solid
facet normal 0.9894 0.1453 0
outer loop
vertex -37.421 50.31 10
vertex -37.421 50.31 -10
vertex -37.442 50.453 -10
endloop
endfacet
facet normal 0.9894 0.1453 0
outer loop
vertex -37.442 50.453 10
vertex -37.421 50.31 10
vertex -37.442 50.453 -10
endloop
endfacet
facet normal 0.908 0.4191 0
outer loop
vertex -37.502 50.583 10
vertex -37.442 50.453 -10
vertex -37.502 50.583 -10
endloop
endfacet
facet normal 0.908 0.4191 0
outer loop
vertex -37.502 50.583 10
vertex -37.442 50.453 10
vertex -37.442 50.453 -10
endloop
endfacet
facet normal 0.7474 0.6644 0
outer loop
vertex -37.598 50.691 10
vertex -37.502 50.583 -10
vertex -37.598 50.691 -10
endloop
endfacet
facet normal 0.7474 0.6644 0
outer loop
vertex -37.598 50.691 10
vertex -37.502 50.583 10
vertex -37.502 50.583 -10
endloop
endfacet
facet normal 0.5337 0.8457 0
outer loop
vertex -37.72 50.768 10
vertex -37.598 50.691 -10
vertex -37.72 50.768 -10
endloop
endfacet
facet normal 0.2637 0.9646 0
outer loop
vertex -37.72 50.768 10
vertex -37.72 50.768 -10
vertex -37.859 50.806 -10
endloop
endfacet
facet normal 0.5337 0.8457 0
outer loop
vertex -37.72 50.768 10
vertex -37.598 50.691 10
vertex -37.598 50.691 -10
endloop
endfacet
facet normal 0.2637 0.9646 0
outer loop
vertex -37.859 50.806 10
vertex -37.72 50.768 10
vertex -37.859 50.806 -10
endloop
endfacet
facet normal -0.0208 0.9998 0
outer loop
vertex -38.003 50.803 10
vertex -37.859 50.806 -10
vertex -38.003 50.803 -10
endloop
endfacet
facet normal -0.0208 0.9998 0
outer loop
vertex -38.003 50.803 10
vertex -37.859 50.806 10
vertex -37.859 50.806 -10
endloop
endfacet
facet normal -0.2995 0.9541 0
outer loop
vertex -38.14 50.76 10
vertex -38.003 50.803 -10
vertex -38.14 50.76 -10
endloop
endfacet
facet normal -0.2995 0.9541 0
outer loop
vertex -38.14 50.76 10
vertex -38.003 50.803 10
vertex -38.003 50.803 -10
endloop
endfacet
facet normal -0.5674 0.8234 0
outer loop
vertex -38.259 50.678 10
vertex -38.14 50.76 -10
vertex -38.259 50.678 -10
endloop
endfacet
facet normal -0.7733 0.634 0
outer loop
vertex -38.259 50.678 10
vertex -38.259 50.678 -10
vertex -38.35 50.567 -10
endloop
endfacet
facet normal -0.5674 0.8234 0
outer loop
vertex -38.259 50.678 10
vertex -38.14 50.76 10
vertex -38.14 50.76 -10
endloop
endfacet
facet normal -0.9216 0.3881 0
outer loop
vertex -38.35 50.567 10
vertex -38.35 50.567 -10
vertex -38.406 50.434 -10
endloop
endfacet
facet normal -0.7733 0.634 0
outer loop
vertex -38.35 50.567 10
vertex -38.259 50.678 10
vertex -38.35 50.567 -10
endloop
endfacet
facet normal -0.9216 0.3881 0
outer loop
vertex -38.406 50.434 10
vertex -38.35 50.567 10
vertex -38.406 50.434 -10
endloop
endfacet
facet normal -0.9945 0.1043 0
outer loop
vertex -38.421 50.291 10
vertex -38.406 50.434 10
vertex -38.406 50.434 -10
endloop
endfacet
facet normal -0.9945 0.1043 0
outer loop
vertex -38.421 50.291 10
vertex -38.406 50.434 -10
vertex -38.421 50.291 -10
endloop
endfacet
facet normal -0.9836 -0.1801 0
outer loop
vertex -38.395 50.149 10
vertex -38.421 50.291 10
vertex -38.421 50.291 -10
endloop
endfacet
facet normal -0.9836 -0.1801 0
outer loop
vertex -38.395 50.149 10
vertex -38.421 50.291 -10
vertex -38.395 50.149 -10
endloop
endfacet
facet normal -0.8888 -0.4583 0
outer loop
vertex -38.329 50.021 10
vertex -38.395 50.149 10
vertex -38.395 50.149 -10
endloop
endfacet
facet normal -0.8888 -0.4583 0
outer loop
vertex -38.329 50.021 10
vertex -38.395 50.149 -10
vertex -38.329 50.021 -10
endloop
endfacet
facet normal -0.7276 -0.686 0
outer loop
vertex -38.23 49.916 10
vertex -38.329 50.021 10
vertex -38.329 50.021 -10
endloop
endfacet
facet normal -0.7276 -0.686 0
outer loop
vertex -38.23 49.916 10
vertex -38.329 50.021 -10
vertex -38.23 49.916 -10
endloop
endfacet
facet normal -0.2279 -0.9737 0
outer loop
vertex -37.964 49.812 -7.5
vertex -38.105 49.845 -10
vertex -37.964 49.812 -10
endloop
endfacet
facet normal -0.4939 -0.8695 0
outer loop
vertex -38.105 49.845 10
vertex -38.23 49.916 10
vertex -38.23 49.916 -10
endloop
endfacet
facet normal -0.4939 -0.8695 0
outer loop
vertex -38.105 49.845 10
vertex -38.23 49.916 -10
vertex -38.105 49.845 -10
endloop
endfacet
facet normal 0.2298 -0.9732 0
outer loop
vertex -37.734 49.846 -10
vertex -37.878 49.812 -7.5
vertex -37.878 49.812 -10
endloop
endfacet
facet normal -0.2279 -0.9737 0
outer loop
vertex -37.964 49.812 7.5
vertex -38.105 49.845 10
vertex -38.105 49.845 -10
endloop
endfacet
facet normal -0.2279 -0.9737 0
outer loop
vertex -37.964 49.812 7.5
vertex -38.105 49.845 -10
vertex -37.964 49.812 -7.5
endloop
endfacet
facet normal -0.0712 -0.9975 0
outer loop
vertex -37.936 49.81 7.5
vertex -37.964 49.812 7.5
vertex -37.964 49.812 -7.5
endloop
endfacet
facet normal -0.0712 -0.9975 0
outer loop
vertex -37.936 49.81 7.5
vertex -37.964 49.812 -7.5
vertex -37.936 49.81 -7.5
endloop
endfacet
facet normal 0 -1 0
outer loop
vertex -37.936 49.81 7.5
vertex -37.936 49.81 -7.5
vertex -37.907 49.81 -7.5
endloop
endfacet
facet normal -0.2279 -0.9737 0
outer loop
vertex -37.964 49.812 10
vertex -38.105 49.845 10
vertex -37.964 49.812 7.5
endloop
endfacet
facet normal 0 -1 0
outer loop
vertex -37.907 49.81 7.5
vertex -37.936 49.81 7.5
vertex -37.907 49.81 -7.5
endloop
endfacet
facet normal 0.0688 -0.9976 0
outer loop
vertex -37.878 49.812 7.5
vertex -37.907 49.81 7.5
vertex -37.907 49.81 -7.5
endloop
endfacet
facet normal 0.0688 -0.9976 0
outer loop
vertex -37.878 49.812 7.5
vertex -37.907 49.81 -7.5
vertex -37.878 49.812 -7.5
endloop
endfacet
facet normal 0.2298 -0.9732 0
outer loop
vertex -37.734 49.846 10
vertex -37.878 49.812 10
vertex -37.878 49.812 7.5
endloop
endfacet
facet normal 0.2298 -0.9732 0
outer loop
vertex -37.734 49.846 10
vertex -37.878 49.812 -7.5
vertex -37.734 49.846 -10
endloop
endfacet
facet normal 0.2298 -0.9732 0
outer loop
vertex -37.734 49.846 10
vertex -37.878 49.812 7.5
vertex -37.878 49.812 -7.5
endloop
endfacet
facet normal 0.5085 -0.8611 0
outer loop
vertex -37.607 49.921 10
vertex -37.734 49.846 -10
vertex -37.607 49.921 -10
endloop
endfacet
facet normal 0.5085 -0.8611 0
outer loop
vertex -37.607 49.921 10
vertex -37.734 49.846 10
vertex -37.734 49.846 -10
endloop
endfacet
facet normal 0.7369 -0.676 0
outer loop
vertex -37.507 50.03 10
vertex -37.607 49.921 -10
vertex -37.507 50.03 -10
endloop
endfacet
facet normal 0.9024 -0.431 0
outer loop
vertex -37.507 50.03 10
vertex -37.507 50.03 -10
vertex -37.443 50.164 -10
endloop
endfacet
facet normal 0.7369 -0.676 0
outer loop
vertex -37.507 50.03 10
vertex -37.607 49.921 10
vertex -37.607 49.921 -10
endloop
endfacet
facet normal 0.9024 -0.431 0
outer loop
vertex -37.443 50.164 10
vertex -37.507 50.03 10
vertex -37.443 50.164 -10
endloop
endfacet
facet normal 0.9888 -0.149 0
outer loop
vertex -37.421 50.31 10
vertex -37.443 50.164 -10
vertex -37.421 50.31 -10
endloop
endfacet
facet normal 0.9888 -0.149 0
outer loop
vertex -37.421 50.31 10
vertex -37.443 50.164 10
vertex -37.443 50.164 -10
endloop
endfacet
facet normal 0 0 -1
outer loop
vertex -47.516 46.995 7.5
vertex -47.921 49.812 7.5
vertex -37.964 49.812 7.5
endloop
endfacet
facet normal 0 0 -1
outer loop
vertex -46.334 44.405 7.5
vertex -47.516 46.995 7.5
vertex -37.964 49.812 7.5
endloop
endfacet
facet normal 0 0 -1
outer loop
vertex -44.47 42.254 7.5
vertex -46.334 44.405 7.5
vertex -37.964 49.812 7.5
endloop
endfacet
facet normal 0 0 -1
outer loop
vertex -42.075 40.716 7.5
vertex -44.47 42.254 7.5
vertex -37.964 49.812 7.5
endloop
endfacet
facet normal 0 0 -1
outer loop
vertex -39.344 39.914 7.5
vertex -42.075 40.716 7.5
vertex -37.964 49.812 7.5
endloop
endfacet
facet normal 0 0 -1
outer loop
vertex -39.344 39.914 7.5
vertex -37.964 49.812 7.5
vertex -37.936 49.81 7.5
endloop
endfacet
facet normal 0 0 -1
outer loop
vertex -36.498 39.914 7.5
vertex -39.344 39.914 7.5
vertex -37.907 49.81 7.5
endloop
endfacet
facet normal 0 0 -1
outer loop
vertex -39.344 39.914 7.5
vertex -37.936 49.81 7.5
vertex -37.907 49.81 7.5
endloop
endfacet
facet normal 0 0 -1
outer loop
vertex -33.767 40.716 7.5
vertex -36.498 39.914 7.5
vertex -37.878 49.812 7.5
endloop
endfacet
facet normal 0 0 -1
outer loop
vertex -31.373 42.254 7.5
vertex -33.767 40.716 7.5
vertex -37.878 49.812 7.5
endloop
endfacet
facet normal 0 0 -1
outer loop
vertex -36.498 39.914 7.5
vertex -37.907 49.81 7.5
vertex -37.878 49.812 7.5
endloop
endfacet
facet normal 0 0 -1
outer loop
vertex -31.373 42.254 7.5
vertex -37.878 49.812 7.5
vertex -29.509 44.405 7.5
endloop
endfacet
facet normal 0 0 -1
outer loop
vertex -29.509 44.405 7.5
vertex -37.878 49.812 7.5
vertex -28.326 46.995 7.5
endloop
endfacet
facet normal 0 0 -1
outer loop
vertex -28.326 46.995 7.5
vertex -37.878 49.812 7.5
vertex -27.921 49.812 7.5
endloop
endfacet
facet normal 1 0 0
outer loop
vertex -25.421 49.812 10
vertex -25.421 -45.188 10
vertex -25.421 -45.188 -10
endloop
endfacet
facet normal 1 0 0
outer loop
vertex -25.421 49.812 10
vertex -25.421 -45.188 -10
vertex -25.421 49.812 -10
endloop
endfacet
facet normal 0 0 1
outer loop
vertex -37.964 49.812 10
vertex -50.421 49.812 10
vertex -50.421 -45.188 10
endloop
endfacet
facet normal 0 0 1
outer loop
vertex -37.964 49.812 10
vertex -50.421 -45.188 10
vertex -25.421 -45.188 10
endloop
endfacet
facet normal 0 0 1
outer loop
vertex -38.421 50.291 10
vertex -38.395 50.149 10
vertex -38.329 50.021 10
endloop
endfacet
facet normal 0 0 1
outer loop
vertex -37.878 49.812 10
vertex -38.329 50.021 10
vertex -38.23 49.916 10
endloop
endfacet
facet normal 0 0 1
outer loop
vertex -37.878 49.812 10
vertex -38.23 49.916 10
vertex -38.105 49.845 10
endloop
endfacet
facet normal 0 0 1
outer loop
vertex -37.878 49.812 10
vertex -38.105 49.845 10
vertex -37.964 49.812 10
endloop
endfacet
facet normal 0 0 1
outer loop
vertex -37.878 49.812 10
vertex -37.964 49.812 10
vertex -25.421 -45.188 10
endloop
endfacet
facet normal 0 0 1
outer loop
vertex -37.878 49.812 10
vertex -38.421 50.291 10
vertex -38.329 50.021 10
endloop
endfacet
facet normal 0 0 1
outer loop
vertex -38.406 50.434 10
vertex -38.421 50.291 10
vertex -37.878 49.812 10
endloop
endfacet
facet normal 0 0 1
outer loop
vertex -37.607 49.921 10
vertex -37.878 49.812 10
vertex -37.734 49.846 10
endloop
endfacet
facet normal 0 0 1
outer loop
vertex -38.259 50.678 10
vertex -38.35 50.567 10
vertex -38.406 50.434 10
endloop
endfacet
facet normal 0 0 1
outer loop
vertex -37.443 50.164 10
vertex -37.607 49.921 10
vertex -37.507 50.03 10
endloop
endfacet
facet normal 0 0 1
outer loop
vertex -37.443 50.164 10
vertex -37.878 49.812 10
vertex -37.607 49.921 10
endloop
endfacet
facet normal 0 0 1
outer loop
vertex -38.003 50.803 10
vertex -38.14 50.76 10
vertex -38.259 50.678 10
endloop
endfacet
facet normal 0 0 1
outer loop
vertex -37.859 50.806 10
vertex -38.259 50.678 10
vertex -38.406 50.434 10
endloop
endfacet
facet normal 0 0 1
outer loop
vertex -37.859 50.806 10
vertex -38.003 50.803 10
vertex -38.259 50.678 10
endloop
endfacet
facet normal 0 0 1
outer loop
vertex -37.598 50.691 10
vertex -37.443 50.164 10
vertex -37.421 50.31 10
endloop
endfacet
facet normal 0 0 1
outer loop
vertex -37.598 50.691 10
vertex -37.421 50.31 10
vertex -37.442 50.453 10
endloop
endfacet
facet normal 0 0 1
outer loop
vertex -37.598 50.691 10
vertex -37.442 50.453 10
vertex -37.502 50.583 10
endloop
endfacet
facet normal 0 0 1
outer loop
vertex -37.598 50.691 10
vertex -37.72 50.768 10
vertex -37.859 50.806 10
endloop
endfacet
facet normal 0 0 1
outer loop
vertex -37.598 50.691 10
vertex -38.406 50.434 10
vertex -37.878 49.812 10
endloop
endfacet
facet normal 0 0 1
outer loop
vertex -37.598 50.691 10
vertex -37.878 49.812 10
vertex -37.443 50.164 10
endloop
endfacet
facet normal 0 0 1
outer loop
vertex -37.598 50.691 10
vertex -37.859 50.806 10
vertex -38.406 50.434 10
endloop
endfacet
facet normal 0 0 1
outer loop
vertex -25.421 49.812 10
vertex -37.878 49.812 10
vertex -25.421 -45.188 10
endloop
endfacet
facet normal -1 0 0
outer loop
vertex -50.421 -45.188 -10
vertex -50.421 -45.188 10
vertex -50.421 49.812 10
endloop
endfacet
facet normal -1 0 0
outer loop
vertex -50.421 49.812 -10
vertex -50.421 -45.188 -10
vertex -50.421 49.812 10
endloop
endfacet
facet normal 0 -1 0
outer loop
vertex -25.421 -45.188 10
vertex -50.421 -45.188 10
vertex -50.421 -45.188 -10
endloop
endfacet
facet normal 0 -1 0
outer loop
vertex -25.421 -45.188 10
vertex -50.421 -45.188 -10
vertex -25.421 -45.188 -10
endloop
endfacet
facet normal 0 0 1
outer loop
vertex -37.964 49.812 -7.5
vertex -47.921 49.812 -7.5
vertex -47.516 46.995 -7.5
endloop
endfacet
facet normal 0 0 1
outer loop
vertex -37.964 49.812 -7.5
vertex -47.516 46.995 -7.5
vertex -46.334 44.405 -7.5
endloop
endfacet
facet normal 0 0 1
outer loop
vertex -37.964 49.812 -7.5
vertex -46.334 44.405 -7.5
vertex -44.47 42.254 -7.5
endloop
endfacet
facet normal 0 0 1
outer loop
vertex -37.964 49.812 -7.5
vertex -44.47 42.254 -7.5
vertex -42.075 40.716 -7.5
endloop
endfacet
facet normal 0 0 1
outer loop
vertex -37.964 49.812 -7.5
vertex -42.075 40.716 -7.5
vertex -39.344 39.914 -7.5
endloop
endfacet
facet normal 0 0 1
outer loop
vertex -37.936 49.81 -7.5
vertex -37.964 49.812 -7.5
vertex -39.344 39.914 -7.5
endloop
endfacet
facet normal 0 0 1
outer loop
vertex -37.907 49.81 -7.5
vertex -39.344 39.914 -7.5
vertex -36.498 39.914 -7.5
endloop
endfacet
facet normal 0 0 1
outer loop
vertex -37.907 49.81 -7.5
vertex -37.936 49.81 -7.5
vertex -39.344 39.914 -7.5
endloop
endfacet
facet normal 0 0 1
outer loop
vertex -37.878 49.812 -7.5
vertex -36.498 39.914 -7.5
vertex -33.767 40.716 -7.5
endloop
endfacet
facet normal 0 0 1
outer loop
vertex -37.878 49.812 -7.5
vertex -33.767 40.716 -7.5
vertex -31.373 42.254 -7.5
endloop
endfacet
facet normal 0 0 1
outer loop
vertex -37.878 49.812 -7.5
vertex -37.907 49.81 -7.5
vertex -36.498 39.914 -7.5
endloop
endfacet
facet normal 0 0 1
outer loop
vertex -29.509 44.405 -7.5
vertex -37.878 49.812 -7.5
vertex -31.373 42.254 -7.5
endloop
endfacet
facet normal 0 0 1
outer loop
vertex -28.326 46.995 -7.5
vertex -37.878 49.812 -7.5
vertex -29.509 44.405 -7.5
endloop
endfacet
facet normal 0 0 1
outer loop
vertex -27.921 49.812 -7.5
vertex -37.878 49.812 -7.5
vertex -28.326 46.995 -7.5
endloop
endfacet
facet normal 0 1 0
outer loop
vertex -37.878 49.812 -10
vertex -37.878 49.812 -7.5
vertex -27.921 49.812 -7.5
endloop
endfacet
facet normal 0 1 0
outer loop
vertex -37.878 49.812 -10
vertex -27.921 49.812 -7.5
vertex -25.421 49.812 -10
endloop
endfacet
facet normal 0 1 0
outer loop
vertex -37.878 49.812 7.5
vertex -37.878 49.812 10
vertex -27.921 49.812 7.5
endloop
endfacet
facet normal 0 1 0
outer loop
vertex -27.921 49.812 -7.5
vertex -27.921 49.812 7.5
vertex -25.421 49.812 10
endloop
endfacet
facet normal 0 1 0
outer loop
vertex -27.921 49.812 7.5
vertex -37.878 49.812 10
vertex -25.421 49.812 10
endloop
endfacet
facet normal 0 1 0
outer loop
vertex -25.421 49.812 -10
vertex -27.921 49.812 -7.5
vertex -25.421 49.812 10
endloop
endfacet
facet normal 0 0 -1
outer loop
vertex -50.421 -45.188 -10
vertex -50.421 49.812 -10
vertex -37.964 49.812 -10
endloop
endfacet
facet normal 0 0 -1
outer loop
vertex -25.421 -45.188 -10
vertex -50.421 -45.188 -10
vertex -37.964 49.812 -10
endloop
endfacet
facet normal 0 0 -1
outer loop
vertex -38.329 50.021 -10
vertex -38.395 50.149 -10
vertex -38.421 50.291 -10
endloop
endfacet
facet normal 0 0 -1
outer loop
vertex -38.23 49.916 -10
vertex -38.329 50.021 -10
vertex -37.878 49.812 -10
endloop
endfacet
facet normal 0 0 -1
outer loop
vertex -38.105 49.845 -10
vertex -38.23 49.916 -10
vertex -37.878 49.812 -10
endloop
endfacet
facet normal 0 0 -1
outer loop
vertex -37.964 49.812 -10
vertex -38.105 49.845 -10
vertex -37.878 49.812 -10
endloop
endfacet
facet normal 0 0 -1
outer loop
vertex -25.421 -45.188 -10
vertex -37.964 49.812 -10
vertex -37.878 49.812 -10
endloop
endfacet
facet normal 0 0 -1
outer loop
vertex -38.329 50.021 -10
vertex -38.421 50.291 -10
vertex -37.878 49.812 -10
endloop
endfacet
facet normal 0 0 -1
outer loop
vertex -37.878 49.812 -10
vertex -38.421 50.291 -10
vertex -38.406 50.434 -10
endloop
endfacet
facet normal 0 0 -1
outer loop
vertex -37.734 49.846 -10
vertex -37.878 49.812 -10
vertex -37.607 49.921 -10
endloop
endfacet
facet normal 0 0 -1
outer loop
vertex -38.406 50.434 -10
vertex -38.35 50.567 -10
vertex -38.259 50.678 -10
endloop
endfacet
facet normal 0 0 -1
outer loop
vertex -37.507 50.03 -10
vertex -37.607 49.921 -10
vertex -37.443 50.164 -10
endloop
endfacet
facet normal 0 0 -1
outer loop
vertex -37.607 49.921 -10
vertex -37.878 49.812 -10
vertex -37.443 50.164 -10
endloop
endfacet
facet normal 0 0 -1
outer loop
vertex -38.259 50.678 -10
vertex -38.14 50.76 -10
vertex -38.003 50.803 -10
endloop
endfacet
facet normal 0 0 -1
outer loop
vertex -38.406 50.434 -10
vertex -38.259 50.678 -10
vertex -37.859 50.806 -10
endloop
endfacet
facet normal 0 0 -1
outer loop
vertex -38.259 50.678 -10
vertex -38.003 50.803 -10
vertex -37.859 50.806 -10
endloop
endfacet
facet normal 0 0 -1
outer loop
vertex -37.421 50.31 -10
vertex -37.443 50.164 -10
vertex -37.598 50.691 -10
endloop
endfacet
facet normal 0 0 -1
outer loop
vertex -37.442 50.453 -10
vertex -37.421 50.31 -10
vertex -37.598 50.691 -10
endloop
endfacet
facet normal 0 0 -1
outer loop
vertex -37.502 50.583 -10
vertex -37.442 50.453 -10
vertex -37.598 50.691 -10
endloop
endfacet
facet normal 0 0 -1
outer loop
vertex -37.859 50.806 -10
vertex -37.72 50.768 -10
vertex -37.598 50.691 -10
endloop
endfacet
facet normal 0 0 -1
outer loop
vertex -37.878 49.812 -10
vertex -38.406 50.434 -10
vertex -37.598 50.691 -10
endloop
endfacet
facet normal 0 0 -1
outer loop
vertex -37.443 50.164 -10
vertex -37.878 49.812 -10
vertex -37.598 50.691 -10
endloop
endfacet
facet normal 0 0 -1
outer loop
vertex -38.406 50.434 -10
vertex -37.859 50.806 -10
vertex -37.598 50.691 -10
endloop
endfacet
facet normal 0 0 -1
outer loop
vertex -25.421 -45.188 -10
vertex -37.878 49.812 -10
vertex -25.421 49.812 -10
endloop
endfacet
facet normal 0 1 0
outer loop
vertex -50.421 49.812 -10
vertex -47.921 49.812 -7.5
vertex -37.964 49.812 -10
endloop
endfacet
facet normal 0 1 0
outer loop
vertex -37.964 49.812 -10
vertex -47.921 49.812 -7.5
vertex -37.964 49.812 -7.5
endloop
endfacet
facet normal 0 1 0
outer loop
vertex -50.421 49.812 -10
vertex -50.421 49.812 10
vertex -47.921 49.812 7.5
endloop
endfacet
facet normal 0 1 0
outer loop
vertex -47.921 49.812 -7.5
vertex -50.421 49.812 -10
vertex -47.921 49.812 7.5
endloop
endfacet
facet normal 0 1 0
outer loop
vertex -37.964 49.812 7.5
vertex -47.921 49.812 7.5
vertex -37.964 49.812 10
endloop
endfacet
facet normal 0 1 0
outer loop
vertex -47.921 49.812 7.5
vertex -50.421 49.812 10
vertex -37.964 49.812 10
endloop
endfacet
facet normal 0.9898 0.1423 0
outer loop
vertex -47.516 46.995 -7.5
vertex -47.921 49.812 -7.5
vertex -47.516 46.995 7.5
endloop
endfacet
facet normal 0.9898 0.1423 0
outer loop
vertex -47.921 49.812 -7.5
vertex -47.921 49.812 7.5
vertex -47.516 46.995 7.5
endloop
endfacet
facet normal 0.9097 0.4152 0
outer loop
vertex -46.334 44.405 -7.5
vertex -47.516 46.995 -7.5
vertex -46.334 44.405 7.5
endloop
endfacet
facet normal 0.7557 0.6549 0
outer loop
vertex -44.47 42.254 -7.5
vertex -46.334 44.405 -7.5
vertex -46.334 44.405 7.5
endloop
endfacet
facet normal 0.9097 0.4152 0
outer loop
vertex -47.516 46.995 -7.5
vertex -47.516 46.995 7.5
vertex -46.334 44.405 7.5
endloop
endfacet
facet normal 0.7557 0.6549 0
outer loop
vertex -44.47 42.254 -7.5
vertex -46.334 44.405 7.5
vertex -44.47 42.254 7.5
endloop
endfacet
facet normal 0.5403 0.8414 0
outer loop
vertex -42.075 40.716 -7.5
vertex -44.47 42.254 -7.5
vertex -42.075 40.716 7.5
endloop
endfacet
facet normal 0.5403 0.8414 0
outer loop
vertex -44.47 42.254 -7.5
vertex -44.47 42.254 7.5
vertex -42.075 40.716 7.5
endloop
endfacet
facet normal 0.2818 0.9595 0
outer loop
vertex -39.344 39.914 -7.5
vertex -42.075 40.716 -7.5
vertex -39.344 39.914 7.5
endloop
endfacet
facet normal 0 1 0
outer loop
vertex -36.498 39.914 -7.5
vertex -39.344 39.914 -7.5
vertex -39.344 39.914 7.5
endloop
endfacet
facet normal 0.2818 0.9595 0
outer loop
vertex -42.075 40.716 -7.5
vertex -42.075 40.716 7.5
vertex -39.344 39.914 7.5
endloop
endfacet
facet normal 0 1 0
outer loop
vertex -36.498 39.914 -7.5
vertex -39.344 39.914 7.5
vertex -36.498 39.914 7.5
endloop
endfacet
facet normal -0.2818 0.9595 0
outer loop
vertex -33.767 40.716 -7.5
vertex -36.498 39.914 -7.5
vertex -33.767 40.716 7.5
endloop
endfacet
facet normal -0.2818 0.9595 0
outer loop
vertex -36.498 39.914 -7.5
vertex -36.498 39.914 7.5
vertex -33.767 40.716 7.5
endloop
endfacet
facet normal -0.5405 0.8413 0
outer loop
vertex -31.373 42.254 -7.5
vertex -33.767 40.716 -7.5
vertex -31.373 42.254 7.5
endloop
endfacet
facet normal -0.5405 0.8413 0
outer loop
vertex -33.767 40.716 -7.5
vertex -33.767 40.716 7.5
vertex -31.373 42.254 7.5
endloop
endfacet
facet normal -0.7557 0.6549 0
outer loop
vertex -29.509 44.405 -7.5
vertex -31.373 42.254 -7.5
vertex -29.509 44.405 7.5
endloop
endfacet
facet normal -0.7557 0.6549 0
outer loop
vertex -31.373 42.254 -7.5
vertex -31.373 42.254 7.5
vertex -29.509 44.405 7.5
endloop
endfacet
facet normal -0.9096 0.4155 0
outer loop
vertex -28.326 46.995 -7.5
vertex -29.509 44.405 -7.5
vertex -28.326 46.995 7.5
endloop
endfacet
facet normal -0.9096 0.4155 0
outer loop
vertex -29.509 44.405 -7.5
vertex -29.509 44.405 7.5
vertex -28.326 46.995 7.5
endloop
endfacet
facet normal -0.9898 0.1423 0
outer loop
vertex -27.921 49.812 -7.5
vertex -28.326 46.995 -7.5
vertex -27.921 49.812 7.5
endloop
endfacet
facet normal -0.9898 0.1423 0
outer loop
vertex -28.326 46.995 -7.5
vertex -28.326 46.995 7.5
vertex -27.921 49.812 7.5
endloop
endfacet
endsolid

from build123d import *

# Parameters (mm, degrees)
SKETCH1_W           = 25
SKETCH1_H           = 95
BOSS_EXTRUDE1_DEPTH = 10
SKETCH2_R           = 10
CUT_EXTRUDE1_DEPTH  = 7.5
SWEEP1_PROFILE_R    = 0.5


with BuildPart() as part:
    # Sketch1 → Boss-Extrude1 (new body, symmetric)
    with BuildSketch(Plane.XY):
        with Locations((-37.921146953, 2.311827957)):
            Rectangle(SKETCH1_W, SKETCH1_H)
    extrude(amount=BOSS_EXTRUDE1_DEPTH, both=True)

    # Sketch2 → Cut-Extrude1 (cut, symmetric)
    with BuildSketch(Plane.XY):
        with Locations((-37.921146953, 49.811827957)):
            Circle(SKETCH2_R)
    extrude(amount=CUT_EXTRUDE1_DEPTH, both=True, mode=Mode.SUBTRACT)

    # Sweep1: sweep along a path in Sketch4
    with BuildLine(Plane.ZY.offset(37.921146953)) as sweep1_path:
        Line((-10, 50.309963159), (10, 50.309963159))
    # Sweep1 profile (on start of the path) → Sweep1 (sweep)
    with BuildSketch(Plane(origin=(-37.921146953, 50.309963159, -10), x_dir=(1, 0, 0), z_dir=(0, 0, 1))):
        Circle(SWEEP1_PROFILE_R)
    sweep(path=sweep1_path.line)


solid = part.part
